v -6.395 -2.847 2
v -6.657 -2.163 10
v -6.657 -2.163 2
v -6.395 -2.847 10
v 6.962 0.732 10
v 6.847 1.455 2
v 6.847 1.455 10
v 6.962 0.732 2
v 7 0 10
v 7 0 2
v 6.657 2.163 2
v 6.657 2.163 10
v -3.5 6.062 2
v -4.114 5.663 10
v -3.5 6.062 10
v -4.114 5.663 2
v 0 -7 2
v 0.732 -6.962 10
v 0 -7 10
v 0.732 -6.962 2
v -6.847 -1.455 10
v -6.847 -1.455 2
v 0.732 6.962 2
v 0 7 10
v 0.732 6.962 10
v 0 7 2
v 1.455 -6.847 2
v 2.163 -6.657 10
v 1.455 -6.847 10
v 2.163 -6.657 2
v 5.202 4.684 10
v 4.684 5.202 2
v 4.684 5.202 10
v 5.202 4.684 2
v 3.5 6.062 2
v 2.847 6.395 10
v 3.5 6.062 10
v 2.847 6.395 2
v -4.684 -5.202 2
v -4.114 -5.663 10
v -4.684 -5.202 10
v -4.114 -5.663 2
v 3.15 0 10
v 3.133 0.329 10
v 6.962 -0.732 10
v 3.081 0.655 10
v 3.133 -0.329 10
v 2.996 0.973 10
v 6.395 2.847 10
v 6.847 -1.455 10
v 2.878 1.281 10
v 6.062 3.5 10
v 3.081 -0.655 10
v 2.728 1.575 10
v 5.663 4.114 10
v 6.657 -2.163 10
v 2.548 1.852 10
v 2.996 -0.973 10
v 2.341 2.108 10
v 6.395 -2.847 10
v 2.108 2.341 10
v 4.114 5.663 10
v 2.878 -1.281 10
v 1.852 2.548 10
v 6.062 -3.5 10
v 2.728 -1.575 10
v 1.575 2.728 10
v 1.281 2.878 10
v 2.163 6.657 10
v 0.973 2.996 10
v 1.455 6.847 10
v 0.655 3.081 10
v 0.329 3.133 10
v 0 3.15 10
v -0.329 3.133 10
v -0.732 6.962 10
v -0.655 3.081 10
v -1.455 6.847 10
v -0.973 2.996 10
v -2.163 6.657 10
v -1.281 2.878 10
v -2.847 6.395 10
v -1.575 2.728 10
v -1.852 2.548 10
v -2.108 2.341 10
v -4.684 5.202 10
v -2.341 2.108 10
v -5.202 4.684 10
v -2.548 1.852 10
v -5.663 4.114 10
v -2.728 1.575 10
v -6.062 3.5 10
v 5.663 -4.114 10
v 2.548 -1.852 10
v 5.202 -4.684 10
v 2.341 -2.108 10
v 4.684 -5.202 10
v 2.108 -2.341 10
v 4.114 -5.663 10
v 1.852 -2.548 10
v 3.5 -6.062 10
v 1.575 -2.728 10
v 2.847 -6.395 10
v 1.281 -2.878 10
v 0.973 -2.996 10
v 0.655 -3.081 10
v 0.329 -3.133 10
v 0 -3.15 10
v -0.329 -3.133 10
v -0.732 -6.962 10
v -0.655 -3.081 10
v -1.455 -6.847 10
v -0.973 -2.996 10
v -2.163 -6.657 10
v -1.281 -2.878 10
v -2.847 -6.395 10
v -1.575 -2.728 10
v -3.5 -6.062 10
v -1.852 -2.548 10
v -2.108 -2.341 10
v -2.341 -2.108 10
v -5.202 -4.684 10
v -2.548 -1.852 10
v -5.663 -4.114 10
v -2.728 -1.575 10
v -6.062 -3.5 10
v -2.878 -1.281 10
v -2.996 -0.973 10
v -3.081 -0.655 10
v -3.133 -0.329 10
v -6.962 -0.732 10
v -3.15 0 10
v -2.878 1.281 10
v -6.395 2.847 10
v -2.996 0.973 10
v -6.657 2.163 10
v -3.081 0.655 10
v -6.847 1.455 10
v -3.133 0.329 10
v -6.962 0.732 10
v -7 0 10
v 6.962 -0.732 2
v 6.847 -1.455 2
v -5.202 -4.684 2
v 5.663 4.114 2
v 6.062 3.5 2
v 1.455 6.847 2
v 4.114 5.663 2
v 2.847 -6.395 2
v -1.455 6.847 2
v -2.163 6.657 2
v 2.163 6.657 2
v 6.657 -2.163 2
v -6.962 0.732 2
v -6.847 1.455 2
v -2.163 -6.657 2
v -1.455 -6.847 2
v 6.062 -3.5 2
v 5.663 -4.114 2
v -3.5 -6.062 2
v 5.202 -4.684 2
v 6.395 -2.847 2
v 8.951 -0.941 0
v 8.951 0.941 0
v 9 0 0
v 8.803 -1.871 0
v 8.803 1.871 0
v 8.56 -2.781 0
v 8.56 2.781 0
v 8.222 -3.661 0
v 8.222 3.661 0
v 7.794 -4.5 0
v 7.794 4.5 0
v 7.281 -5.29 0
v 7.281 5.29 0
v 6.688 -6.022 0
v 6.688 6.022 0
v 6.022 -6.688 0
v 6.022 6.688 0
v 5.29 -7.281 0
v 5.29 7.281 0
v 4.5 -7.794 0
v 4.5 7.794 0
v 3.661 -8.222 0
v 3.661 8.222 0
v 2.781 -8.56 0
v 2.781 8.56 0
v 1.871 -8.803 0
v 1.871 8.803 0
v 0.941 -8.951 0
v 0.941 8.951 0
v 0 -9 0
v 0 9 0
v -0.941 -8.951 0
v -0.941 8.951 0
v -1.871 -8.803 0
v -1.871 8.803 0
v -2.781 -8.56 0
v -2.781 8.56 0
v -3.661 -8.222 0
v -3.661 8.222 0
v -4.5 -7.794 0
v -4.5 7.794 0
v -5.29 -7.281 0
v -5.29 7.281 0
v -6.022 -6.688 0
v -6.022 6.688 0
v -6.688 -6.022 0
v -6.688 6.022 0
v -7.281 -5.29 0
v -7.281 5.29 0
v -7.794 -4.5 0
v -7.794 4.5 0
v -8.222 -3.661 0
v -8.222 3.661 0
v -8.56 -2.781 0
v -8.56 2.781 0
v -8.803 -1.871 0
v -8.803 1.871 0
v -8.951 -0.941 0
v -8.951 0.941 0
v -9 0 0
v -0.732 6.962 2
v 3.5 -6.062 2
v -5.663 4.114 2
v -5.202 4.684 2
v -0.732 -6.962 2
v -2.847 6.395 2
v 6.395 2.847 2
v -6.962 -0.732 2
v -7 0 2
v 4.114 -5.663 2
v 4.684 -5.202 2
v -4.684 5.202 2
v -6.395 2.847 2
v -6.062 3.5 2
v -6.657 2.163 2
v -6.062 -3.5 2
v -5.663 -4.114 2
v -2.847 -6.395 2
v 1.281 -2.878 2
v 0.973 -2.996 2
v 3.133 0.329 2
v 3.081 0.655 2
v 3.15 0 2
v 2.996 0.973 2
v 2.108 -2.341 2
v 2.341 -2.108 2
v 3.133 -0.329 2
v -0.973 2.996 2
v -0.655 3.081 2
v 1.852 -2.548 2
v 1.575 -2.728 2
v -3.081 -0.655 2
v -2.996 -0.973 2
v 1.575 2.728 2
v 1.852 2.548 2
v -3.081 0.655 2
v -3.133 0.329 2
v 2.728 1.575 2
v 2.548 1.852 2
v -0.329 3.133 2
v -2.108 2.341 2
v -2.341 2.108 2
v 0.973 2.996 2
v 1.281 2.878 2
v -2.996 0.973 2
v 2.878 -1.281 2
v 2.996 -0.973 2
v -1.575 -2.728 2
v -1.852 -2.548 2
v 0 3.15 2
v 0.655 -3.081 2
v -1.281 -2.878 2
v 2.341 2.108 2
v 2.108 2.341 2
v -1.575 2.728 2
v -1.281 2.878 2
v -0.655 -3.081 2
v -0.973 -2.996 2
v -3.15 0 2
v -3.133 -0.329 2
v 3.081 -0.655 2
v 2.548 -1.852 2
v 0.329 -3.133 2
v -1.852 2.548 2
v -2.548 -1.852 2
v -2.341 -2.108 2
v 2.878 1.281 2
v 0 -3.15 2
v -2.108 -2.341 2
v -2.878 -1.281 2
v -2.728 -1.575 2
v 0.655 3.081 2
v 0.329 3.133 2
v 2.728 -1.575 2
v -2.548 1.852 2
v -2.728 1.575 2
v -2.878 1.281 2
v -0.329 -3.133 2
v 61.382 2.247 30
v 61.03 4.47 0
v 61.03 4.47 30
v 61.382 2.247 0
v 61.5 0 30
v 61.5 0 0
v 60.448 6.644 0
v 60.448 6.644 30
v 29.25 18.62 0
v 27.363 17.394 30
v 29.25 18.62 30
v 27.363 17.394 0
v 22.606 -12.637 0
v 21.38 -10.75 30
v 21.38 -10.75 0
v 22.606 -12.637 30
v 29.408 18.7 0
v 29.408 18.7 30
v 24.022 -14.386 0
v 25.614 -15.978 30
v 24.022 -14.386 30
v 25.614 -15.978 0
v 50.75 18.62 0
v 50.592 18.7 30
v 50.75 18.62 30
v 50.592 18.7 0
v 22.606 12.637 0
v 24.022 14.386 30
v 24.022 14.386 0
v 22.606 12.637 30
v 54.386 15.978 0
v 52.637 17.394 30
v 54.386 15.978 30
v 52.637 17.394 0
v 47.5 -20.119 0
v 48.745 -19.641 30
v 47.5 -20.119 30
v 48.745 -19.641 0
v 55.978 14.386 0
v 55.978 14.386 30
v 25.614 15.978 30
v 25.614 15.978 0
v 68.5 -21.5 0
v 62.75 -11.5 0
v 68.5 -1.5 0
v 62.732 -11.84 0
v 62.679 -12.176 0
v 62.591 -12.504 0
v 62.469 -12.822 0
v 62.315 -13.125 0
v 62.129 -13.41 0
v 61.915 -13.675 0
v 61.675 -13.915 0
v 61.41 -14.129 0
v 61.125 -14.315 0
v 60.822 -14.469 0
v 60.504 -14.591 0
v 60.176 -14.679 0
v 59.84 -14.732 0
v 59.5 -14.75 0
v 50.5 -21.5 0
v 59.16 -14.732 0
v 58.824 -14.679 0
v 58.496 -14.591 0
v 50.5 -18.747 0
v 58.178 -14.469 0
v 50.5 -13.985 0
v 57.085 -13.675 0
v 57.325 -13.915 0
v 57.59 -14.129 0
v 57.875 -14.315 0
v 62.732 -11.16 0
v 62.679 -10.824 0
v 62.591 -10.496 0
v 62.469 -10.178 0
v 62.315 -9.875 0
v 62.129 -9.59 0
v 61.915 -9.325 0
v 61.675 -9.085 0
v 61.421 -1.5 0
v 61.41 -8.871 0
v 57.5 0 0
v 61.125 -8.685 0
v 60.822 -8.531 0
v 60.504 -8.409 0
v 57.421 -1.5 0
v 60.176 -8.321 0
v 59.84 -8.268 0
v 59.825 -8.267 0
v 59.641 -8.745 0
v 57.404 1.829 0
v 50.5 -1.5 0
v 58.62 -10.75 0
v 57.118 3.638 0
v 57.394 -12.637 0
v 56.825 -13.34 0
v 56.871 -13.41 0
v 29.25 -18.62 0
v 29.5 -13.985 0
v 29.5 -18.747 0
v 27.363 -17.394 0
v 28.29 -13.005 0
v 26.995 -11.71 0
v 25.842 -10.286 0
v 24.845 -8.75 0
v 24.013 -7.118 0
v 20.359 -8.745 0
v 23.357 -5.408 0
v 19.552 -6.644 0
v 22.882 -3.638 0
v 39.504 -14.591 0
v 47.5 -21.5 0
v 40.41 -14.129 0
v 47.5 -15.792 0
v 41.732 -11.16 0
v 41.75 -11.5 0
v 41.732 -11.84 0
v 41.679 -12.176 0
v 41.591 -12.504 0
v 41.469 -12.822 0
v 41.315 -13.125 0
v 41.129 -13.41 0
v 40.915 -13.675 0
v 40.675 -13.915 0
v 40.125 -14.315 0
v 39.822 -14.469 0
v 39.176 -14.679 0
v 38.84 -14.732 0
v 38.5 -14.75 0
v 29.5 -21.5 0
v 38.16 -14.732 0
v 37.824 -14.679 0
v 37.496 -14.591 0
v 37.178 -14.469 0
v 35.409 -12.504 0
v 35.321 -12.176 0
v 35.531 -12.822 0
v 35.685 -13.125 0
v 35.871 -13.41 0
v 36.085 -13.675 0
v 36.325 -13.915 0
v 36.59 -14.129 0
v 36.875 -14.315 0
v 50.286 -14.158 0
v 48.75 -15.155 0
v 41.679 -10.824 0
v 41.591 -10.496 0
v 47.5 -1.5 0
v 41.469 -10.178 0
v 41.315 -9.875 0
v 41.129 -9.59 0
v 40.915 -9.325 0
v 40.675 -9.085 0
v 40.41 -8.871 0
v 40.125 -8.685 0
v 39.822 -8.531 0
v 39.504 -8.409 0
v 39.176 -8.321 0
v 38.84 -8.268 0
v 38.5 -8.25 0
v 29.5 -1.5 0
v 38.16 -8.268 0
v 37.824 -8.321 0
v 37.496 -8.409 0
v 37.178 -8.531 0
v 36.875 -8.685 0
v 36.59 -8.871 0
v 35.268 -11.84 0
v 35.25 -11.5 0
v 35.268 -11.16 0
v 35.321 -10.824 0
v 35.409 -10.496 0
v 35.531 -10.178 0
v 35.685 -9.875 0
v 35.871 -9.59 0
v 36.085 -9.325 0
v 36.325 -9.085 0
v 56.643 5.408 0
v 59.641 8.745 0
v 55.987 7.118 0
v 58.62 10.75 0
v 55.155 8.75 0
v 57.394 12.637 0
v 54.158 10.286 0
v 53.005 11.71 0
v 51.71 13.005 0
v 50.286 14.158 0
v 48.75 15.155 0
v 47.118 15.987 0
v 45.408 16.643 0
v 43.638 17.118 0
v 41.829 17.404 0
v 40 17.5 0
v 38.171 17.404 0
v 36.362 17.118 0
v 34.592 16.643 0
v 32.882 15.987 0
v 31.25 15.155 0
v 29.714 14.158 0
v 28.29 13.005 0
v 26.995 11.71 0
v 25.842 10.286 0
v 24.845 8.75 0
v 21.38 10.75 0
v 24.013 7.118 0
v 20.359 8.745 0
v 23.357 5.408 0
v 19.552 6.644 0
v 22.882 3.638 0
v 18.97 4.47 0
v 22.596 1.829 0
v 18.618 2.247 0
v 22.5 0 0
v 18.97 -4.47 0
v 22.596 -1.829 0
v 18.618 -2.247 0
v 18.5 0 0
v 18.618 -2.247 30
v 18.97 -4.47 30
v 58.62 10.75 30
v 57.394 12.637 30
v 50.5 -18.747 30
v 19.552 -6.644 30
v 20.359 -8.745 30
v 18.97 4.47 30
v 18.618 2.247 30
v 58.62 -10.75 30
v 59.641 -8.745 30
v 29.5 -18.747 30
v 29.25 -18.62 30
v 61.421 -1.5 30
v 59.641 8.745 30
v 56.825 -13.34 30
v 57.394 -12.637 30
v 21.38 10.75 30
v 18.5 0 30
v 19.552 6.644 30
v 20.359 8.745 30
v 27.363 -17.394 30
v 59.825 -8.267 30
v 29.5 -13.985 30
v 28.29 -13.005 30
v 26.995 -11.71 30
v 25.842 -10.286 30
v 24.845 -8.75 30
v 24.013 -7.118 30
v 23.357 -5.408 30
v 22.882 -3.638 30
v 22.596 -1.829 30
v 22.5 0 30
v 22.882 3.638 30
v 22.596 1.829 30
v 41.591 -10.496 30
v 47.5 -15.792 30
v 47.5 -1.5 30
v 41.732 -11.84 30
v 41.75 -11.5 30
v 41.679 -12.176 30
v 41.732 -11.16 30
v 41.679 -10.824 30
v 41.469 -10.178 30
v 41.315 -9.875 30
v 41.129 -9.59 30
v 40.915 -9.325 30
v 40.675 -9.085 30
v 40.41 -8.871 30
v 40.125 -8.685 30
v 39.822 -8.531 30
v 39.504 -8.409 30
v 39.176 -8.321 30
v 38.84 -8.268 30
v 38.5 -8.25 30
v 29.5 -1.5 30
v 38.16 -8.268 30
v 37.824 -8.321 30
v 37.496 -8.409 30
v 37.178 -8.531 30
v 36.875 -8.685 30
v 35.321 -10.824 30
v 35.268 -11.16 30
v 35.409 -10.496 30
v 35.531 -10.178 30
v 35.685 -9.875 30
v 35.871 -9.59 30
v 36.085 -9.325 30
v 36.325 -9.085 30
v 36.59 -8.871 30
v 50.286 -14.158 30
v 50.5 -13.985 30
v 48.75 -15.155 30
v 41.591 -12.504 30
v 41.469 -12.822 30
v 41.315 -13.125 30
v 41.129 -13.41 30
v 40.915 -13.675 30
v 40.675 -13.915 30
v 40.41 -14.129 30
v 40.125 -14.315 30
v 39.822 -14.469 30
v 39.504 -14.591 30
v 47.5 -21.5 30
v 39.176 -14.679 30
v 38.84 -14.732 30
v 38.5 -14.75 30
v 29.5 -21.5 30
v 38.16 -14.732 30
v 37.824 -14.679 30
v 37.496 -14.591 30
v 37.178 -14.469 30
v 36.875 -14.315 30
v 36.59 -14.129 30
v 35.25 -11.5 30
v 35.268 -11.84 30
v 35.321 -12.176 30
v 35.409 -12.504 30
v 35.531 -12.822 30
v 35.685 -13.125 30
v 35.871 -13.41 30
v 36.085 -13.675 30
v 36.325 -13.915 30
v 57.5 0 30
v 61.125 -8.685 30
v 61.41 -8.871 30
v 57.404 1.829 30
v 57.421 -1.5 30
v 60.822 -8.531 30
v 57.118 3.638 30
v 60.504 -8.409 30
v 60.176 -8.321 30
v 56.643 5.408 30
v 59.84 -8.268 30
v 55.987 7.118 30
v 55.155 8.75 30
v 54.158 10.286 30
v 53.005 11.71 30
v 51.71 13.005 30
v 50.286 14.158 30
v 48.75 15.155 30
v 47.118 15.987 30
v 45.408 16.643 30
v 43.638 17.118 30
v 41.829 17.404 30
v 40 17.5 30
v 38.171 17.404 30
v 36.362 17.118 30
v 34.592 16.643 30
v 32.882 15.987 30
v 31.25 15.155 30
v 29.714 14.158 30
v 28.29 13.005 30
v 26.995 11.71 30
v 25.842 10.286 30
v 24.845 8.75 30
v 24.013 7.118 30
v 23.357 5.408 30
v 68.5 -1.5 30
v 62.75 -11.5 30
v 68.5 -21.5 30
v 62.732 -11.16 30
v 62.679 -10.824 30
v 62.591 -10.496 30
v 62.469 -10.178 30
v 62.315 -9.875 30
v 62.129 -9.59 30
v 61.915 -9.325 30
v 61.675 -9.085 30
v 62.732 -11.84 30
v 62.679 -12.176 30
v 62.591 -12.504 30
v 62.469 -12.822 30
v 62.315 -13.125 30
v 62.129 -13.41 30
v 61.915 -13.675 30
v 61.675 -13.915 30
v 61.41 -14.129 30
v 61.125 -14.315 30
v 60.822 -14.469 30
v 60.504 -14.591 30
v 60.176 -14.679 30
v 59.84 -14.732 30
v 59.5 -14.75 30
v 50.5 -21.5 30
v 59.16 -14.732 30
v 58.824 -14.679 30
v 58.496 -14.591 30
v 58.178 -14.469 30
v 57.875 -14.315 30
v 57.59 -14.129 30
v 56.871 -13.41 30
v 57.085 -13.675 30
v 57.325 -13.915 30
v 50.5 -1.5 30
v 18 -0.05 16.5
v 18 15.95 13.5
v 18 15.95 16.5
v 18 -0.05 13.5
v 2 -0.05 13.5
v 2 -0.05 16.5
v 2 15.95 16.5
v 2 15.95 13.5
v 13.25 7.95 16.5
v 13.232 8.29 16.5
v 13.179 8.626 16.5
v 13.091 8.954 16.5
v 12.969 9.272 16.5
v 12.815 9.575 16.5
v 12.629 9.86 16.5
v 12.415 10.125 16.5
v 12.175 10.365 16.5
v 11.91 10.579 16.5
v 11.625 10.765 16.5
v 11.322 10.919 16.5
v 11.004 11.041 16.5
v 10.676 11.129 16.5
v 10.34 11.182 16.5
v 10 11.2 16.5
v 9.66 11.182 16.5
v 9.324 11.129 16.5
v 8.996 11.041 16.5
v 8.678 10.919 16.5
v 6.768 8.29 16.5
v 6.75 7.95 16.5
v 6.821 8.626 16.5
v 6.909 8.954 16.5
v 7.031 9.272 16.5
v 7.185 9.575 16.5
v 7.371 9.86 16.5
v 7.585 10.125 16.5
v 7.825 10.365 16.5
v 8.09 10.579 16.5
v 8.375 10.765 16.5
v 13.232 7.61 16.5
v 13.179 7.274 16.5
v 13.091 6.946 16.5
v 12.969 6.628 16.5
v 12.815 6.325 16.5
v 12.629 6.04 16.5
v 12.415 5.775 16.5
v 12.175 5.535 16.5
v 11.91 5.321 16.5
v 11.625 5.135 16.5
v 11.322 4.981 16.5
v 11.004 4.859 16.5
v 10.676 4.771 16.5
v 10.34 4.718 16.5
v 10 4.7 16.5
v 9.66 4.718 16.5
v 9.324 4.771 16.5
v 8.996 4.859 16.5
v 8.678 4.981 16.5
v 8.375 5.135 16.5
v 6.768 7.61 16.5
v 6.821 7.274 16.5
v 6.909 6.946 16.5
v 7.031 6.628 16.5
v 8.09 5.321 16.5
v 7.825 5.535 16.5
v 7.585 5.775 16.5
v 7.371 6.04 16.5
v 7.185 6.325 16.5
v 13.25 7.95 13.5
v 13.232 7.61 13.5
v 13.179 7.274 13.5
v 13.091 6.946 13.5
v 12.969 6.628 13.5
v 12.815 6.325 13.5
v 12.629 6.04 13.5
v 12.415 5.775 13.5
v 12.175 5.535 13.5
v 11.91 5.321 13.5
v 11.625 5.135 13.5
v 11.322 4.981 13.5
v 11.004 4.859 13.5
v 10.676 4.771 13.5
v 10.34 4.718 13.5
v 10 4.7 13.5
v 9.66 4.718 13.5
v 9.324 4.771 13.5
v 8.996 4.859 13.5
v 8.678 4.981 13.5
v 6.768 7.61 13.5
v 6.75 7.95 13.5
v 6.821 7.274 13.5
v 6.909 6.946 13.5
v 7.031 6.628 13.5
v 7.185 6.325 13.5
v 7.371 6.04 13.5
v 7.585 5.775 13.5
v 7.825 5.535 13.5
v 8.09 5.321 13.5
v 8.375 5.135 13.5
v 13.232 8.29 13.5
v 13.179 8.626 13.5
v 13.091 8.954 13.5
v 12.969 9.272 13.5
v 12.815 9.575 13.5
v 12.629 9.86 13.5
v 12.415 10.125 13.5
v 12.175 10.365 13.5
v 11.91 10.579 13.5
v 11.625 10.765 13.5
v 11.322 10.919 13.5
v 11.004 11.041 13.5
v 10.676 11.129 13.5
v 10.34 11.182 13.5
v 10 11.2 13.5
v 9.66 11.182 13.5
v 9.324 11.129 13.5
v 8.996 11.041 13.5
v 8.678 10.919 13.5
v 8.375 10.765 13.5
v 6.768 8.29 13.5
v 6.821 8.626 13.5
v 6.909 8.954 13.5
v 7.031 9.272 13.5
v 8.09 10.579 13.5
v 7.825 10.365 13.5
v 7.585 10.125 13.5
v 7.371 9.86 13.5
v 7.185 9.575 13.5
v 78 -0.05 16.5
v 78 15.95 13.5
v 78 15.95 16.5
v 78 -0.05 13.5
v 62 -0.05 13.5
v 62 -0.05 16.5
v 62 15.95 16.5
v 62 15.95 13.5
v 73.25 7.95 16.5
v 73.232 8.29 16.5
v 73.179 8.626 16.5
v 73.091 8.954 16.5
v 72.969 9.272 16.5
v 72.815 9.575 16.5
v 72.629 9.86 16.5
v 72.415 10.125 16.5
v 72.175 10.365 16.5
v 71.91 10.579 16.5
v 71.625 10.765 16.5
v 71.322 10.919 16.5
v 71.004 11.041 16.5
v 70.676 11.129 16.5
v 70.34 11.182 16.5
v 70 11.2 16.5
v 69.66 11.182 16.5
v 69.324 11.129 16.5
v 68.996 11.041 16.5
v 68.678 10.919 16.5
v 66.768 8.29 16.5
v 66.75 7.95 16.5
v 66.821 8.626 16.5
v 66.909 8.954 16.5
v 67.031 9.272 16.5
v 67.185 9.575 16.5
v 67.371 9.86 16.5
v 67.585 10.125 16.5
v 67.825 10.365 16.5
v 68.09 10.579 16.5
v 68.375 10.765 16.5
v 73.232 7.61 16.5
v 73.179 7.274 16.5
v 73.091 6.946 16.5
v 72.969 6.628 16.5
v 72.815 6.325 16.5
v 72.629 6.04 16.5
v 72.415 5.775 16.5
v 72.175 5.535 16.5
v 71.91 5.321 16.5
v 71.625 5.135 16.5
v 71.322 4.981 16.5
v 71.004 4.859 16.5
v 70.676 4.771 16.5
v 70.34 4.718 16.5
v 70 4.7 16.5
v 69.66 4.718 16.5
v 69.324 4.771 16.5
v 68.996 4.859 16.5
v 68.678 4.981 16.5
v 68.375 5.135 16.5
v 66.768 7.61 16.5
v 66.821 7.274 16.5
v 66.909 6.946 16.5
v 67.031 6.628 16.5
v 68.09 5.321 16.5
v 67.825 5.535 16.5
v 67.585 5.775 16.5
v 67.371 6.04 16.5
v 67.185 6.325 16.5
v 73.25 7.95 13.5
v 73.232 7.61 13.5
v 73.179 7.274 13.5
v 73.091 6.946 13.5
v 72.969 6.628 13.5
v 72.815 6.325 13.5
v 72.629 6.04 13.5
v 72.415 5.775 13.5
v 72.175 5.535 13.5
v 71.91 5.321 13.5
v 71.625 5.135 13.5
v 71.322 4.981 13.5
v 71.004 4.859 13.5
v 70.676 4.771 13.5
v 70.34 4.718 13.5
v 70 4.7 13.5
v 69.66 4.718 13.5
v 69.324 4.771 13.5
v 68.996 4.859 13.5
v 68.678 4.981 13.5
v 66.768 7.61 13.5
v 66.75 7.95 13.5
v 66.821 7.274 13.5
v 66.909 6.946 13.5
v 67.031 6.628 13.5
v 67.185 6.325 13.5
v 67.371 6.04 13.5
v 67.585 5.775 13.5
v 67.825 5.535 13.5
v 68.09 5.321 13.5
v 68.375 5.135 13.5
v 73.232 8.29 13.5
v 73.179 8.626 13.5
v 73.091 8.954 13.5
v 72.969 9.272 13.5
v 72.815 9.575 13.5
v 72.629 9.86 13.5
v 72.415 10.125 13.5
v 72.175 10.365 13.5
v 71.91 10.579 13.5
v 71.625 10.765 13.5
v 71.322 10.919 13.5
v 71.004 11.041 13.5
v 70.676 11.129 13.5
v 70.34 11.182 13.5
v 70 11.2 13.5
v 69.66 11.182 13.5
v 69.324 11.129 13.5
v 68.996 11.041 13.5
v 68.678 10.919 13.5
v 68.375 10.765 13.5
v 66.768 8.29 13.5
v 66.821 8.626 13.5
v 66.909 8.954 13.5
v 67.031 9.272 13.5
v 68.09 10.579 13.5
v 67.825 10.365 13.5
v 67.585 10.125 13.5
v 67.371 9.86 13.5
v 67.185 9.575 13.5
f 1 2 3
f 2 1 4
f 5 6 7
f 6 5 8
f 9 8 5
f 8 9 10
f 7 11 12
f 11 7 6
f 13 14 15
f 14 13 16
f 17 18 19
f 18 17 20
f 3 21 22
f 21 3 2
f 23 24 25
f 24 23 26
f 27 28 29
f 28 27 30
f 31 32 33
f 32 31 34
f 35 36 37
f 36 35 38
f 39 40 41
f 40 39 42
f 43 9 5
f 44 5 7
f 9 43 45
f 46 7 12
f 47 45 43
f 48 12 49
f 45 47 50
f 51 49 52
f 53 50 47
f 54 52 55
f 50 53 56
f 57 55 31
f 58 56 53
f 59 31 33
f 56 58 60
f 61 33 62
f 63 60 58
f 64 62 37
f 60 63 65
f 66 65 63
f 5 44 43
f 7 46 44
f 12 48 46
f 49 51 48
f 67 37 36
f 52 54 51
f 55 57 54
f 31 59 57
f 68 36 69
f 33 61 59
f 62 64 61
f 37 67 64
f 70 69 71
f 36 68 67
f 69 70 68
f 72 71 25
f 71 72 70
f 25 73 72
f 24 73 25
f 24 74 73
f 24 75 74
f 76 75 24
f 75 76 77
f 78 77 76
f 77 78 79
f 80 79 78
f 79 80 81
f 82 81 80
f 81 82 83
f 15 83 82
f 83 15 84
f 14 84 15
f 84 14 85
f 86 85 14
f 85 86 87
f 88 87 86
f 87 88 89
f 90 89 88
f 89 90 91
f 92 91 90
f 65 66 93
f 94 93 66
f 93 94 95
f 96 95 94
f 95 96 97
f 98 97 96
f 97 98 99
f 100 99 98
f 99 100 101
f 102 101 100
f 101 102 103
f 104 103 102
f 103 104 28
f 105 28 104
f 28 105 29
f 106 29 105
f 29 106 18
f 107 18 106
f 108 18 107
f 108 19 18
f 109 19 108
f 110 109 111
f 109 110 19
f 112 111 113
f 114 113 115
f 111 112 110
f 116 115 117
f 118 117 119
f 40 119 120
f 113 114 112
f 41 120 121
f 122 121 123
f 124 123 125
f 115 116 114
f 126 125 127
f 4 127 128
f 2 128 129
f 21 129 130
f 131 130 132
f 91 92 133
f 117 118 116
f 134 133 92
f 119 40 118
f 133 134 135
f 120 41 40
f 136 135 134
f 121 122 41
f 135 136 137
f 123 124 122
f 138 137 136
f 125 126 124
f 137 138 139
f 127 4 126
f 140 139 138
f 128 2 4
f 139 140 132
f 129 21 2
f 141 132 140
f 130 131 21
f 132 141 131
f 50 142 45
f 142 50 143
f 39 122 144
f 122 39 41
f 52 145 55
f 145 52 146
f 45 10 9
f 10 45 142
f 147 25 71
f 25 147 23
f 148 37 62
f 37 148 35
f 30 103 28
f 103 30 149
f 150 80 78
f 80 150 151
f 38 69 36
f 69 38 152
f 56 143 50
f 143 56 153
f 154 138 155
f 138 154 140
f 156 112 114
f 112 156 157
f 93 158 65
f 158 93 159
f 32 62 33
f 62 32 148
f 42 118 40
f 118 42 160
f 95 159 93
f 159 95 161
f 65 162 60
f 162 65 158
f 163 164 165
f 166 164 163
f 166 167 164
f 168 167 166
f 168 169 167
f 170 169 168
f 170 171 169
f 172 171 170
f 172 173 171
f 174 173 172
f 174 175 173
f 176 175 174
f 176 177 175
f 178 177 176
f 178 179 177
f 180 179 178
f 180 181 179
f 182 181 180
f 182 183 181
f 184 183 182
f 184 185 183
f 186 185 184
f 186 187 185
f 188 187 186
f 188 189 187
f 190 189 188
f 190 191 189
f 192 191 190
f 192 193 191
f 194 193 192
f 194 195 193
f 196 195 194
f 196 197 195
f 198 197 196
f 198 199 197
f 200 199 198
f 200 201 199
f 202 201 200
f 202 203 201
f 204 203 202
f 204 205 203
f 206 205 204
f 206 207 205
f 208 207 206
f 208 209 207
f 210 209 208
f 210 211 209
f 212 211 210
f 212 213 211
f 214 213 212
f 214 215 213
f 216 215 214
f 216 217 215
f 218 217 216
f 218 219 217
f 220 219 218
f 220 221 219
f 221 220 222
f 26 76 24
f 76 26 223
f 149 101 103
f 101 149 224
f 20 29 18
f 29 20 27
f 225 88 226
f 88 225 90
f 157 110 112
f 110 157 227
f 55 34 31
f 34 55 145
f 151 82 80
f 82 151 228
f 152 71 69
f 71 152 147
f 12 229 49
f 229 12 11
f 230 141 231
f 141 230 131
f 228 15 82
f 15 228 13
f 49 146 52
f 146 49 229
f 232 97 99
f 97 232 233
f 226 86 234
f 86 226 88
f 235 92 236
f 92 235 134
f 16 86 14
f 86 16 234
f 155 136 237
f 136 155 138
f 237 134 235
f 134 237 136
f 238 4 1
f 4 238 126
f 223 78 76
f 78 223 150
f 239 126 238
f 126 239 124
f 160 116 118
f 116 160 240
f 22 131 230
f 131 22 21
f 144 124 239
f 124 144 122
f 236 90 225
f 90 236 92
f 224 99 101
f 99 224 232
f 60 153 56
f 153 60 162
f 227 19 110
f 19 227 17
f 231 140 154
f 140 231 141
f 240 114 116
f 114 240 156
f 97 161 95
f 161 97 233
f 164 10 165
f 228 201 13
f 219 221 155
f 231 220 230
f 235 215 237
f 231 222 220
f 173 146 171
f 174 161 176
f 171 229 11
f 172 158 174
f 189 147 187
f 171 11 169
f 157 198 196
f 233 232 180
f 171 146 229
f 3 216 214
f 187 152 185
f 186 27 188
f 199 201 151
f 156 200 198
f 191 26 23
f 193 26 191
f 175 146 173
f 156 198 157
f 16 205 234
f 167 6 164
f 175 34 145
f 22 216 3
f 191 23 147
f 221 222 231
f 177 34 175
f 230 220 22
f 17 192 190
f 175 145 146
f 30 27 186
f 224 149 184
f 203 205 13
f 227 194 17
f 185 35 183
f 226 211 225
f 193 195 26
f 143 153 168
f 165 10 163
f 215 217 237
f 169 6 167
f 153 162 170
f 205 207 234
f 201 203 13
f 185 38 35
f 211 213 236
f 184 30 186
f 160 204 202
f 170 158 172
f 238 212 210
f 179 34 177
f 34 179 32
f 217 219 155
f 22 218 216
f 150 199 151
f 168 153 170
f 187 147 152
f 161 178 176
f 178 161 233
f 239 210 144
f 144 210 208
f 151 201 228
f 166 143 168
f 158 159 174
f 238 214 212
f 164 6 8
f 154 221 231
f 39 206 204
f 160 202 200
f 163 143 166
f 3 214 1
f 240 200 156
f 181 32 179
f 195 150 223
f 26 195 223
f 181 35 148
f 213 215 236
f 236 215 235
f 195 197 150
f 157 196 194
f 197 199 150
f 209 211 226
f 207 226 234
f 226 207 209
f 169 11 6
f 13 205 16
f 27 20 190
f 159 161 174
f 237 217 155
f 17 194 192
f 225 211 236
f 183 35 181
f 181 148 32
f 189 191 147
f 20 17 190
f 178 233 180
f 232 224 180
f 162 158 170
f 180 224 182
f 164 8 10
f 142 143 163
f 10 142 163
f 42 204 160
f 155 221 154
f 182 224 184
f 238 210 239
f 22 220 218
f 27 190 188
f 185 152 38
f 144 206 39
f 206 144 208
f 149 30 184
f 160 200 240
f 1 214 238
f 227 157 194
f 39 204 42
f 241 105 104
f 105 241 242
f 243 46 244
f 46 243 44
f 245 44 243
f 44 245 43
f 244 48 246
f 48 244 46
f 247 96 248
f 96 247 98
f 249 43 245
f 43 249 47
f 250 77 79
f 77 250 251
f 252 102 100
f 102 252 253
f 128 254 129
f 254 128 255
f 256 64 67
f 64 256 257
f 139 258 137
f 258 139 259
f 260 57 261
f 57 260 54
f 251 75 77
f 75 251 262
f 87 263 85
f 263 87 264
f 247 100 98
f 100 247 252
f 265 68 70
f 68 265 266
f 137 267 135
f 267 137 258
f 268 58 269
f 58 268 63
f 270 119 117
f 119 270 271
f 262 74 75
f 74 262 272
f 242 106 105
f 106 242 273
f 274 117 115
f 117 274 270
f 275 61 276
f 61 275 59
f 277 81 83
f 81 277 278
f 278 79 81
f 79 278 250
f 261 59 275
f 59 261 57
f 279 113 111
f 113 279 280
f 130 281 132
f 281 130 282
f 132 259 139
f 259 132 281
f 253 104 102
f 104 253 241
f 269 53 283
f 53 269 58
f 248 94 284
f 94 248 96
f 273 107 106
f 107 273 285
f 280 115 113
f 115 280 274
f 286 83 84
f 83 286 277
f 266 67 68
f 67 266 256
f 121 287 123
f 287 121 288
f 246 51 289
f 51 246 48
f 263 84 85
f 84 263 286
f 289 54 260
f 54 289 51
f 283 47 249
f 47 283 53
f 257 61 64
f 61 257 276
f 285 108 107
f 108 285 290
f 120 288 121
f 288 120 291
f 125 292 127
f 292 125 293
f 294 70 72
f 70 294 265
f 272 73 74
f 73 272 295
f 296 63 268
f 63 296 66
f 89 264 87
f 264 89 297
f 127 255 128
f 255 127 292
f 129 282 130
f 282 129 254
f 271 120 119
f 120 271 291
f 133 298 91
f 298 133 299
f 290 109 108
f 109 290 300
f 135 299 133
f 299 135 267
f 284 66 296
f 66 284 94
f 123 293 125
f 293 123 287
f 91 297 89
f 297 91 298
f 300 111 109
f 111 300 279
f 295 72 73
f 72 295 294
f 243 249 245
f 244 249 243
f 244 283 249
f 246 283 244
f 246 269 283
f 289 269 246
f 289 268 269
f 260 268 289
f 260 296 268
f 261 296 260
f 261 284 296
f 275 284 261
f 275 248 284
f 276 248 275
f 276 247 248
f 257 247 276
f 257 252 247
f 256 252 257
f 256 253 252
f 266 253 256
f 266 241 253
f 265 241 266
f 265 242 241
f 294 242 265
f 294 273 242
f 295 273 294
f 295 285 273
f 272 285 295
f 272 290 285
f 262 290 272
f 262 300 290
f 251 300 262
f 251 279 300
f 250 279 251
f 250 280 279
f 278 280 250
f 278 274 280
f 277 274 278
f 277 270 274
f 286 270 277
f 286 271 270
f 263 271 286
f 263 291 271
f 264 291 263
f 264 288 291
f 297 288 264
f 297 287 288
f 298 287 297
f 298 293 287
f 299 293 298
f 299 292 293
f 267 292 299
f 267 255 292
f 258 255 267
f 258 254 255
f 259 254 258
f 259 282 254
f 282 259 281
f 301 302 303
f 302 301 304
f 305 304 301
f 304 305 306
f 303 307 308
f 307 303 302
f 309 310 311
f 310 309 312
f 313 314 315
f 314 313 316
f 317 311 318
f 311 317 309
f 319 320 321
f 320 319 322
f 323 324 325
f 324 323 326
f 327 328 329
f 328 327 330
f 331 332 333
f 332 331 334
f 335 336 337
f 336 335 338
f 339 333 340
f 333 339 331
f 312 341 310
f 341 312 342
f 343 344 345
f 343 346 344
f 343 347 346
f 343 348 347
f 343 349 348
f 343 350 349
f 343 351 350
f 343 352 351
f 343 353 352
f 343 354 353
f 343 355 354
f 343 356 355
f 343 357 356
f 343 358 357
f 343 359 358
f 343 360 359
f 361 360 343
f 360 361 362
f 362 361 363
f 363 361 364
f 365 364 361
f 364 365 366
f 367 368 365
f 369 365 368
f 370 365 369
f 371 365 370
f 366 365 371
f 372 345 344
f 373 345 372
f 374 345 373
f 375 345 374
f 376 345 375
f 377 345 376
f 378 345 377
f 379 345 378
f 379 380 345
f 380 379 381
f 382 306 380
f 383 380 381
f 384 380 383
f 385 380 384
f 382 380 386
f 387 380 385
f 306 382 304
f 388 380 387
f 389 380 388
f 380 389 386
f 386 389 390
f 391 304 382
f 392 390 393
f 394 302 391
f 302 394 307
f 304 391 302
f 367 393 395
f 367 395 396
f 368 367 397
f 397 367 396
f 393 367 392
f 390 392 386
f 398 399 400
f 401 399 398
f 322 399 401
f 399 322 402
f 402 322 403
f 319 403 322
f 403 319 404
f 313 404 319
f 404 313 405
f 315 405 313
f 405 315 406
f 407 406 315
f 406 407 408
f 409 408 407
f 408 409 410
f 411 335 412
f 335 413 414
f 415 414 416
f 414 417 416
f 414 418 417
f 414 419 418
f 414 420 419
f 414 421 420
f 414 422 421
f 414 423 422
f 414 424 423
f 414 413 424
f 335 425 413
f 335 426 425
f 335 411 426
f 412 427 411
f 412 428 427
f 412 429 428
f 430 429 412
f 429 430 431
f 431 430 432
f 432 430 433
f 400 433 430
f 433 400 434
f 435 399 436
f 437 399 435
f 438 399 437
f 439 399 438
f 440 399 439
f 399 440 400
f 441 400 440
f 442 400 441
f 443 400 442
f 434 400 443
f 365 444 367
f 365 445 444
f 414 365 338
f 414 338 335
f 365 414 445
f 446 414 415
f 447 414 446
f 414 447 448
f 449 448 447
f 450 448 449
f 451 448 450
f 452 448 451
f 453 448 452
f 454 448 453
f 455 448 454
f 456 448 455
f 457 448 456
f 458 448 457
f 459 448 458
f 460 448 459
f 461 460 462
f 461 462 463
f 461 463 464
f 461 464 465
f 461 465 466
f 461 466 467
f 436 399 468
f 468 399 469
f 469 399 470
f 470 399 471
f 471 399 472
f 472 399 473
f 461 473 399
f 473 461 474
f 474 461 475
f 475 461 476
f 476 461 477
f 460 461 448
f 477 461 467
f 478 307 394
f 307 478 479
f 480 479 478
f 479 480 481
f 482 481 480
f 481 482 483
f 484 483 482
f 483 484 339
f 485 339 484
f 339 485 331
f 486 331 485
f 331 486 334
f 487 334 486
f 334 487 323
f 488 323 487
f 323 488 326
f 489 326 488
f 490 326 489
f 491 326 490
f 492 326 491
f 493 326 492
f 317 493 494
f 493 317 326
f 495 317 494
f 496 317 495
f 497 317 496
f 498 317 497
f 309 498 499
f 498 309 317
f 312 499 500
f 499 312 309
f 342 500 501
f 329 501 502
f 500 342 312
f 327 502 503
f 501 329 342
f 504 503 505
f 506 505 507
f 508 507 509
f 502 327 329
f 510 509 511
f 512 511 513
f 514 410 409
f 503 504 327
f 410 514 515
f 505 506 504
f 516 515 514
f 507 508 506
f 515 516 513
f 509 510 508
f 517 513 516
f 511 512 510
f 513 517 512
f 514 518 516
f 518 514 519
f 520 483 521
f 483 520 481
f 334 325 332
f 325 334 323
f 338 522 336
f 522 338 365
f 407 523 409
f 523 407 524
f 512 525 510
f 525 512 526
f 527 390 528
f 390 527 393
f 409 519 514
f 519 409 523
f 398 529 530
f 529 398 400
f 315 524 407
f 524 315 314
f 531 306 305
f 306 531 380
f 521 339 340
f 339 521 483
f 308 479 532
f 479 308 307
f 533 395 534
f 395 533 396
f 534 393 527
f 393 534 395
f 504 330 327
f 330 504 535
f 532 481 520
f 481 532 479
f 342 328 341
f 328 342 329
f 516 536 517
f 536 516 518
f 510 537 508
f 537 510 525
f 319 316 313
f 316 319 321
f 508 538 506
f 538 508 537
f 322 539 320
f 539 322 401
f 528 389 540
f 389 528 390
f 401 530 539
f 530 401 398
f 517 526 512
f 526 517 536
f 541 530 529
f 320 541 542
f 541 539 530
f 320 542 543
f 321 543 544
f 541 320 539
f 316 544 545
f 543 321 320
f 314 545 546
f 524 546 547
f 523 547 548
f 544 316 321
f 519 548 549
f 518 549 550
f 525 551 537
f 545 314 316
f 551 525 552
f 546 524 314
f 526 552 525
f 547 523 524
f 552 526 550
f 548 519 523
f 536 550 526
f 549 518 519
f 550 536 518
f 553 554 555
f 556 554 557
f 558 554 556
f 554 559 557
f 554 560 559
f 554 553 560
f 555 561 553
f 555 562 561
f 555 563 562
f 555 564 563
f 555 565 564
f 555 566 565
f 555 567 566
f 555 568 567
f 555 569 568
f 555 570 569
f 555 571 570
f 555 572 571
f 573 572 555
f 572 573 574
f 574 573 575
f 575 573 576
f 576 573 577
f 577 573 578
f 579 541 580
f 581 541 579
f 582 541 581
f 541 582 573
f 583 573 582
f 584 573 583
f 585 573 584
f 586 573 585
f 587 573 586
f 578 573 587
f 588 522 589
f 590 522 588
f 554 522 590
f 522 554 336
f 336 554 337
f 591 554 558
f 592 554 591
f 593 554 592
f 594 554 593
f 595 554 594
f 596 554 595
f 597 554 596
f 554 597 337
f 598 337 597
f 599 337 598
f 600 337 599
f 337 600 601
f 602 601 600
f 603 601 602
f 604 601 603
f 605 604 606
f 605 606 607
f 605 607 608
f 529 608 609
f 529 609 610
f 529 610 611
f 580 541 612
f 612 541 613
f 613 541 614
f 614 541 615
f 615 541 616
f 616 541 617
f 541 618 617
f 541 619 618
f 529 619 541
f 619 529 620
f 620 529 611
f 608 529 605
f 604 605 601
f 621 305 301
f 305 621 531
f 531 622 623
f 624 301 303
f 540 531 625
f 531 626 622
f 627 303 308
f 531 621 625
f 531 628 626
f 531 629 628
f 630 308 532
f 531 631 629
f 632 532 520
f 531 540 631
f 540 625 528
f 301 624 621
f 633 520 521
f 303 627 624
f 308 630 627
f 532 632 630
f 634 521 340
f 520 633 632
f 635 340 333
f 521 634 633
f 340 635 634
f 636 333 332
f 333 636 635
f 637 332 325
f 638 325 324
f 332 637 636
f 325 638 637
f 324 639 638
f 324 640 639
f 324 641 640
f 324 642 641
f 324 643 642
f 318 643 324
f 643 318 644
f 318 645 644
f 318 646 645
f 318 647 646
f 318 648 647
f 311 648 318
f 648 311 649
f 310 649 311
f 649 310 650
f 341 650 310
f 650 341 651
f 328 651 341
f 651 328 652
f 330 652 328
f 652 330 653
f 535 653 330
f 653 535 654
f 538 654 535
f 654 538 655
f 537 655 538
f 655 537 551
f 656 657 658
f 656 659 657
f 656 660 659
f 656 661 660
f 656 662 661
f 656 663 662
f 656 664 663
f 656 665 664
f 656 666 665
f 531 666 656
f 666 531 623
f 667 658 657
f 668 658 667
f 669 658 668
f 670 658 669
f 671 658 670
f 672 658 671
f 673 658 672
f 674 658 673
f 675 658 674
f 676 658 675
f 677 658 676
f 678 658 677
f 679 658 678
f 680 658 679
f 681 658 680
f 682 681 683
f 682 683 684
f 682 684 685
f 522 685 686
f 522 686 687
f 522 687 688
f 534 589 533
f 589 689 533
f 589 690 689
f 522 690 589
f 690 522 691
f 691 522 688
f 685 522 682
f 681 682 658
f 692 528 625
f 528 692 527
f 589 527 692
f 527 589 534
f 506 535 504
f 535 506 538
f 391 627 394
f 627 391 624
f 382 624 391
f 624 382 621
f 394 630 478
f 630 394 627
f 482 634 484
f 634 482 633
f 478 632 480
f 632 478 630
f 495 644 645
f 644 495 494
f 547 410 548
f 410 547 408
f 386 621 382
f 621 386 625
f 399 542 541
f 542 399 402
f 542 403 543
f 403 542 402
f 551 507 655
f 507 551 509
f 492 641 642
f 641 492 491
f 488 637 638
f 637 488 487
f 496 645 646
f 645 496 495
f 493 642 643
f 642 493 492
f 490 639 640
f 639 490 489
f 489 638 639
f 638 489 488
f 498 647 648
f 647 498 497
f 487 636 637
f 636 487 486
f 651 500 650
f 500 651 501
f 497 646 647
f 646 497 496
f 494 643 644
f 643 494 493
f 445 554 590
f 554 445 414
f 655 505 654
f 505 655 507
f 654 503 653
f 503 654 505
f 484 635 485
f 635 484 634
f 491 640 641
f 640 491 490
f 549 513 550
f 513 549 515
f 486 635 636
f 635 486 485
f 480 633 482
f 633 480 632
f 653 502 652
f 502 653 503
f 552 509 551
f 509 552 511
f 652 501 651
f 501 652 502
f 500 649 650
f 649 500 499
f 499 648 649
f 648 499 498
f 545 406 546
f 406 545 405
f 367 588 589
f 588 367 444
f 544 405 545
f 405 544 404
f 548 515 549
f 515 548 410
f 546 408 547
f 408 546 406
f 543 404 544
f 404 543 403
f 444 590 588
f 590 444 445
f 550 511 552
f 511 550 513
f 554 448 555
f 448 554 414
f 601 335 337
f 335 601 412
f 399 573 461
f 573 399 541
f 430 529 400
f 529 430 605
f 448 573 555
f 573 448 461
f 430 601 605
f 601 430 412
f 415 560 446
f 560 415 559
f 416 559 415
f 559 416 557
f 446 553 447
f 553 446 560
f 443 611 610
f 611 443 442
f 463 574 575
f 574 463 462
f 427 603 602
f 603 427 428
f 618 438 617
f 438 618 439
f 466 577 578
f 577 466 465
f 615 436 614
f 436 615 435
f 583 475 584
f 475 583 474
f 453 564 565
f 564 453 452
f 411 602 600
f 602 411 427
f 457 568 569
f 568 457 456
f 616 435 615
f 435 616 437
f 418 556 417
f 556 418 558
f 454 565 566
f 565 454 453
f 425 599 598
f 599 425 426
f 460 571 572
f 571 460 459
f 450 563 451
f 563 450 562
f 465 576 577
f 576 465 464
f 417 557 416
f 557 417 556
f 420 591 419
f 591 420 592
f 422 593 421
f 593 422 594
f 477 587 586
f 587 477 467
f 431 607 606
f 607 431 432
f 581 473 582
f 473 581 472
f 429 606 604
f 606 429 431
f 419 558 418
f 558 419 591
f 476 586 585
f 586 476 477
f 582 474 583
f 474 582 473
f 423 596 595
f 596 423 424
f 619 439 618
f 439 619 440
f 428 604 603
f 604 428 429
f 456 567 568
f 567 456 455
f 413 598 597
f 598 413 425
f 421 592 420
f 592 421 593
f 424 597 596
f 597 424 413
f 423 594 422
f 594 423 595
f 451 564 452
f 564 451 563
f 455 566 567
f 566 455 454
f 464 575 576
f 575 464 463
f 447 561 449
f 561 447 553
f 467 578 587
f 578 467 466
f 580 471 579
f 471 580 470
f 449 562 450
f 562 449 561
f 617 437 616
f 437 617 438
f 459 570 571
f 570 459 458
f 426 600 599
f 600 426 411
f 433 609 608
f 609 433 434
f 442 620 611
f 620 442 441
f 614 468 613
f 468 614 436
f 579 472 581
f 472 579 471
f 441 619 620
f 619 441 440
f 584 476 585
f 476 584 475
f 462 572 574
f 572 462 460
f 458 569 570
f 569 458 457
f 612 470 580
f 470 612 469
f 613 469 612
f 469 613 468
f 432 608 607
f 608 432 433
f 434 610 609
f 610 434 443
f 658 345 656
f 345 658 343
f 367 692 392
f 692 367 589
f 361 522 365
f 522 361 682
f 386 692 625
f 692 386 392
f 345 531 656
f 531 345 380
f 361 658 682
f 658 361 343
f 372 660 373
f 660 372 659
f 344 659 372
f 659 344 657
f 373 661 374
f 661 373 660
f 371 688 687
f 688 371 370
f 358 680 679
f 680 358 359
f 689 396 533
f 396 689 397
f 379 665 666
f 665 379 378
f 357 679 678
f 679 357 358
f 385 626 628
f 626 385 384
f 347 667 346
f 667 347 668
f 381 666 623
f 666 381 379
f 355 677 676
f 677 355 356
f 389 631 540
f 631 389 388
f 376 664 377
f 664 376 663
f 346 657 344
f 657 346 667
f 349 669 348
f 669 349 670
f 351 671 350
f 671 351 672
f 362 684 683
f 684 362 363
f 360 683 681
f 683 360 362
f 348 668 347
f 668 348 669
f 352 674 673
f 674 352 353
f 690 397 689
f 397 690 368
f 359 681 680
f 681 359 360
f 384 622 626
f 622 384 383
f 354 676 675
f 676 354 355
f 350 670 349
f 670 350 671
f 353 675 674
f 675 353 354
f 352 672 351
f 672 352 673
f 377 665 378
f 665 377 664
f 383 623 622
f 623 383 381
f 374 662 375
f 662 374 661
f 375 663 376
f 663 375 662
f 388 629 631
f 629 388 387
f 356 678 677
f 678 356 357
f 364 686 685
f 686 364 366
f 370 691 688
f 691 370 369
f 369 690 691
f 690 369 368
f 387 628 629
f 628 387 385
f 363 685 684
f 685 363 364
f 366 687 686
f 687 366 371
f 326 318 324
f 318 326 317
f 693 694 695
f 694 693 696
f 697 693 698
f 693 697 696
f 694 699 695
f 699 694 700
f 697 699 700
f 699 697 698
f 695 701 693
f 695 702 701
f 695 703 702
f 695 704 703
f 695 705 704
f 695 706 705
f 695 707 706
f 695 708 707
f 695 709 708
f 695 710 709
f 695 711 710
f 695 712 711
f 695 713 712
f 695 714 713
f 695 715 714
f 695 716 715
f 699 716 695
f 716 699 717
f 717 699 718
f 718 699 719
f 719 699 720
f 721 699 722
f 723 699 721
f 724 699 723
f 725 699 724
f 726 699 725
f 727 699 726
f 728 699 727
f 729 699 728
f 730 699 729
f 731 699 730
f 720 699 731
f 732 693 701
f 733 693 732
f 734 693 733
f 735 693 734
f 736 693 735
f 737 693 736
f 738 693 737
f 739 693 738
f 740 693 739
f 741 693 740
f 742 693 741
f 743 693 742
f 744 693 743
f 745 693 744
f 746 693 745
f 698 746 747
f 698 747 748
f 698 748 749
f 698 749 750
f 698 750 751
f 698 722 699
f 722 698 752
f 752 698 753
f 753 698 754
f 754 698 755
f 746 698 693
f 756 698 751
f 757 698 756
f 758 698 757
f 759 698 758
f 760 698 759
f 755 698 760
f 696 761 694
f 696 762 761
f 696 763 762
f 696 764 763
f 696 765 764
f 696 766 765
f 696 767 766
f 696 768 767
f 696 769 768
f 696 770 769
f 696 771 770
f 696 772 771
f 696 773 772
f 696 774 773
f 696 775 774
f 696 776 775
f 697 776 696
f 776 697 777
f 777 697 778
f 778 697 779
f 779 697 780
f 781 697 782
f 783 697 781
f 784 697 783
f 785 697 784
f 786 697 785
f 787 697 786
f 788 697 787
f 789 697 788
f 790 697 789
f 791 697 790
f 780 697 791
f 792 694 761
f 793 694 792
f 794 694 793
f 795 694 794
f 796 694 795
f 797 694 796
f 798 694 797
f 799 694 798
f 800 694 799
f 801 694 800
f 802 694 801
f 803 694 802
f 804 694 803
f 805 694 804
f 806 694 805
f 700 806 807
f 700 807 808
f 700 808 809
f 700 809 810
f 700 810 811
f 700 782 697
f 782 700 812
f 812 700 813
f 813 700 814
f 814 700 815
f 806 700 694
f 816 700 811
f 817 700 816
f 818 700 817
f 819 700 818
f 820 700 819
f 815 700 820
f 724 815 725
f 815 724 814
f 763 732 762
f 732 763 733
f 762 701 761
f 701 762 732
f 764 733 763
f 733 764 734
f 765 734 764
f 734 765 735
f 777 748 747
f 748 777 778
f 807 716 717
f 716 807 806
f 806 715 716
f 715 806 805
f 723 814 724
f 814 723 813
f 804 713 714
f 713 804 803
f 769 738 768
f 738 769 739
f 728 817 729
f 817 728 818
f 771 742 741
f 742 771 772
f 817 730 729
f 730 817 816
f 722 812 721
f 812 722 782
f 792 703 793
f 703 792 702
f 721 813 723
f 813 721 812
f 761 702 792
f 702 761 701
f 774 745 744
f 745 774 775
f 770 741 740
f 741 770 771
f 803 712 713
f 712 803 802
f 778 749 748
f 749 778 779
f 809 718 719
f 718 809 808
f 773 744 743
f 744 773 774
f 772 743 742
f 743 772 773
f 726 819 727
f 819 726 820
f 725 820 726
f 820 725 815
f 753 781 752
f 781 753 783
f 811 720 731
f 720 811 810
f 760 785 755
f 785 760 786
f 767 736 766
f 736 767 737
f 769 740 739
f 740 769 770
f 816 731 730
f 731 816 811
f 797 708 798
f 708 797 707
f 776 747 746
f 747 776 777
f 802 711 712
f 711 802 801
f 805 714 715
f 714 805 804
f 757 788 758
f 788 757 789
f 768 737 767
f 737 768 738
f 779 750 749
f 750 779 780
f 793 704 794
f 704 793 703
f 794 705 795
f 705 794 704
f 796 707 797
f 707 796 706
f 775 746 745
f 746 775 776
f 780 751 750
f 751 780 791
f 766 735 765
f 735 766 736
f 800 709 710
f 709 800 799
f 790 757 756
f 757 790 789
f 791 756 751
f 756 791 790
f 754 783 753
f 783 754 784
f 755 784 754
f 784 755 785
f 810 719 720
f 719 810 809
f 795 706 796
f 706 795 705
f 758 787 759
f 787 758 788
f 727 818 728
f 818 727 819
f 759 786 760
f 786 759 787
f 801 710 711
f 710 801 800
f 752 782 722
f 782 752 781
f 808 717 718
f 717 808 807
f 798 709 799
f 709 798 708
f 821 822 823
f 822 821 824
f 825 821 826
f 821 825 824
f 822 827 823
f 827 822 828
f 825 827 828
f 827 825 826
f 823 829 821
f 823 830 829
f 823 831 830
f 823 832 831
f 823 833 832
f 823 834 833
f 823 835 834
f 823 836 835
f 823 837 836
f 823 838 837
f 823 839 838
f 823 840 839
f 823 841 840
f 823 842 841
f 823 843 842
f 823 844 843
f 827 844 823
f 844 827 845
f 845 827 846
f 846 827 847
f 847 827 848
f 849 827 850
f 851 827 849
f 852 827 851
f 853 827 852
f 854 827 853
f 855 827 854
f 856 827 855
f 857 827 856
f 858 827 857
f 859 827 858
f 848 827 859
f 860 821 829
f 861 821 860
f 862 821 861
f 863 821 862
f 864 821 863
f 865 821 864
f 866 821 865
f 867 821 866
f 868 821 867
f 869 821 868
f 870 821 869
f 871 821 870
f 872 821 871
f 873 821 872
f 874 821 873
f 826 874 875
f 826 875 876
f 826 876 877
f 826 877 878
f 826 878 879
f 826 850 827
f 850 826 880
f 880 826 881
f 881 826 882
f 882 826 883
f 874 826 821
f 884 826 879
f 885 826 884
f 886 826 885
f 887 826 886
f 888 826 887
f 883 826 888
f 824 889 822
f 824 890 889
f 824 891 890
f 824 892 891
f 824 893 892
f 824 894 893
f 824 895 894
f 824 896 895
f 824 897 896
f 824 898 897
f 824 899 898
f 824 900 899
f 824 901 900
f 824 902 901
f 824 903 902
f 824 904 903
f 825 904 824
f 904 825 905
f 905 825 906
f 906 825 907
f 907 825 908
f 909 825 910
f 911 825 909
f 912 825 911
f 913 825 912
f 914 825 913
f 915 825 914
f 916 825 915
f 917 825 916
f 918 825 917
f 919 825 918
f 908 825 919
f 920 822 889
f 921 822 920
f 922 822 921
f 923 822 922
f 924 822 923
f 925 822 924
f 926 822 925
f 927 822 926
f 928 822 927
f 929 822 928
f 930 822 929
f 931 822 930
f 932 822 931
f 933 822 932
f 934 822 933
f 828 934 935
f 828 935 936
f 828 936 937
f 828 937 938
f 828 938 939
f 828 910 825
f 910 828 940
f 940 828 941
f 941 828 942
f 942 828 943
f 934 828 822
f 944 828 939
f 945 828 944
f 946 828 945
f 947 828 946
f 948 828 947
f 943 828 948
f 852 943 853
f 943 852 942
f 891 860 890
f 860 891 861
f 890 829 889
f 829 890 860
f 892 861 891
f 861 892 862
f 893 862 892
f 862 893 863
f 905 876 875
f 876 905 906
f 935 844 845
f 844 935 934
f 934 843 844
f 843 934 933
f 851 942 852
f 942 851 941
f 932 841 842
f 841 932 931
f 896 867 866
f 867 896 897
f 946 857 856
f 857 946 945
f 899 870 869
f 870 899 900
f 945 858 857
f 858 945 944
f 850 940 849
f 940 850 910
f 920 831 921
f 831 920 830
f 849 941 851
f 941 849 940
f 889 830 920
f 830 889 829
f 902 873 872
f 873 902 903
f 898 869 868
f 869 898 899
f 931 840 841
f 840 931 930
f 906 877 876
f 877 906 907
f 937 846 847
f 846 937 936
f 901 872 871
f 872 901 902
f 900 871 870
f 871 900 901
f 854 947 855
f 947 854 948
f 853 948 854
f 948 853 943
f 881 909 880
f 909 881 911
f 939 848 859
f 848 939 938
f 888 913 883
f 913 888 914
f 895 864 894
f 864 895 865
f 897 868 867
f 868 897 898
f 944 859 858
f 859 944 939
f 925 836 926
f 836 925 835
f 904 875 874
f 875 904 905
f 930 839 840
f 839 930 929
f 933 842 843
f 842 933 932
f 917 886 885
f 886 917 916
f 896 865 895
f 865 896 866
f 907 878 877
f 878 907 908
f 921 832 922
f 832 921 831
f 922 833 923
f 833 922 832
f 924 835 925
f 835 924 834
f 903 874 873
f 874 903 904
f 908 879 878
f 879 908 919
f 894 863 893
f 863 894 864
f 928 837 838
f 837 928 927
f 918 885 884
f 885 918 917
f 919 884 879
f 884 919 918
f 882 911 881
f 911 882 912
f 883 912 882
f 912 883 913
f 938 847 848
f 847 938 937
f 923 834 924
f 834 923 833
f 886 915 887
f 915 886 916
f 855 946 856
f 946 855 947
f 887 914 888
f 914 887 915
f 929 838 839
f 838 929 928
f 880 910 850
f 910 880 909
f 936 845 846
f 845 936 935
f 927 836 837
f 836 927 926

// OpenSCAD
// =============================================================================
// FestivAir Haven Node — Tripod Mount & Pole Clamp Adapter
// =============================================================================
// 1/4"-20 UNC heat-set insert boss for standard tripod / camera mounts
// 35mm pole clamp adapter with M6 bolt holes for festival pole deployment
// =============================================================================

// --- 1/4"-20 Heat-Set Insert Parameters ---
// Standard brass heat-set insert for 1/4"-20: OD ~6.3mm, length ~6.35mm
insert_od       = 6.3;      // Heat-set insert outer diameter
insert_depth    = 8;         // Hole depth (slightly deeper than insert)
boss_od         = 14;        // Boss outer diameter (structural)
boss_h          = 10;        // Boss total height
boss_fillet     = 2;         // Base fillet radius

// --- 35mm Pole Clamp Parameters ---
pole_dia        = 35;        // Target pole diameter
clamp_thickness = 4;         // Clamp wall thickness
clamp_width     = 30;        // Clamp width (along pole axis)
clamp_gap       = 3;         // Gap for bolt clamping
tab_w           = 18;        // Bolt tab width
tab_h           = 20;        // Bolt tab height from clamp OD
m6_hole         = 6.5;       // M6 bolt clearance hole

// --------------------------------------------------------------------------
// 1/4"-20 heat-set insert boss
// Sits on the bottom face of the enclosure; printed boss-up so the
// cylinder is on the build plate (no supports needed).
// --------------------------------------------------------------------------
module tripod_boss() {
    difference() {
        union() {
            // Main boss cylinder
            cylinder(d = boss_od, h = boss_h, $fn = 60);
            // Base reinforcement fillet (45-degree cone = printable)
            cylinder(d1 = boss_od + boss_fillet * 2,
                     d2 = boss_od,
                     h  = boss_fillet, $fn = 60);
        }
        // Heat-set insert hole (from top, blind hole)
        translate([0, 0, boss_h - insert_depth])
            cylinder(d = insert_od, h = insert_depth + 0.1, $fn = 60);
    }
}

// --------------------------------------------------------------------------
// 35mm pole clamp — C-clamp with bolt tabs
// Mounts to the back face of the enclosure via integrated attachment tabs.
// Clamp opens at the bottom; two M6 bolts squeeze it shut.
// --------------------------------------------------------------------------
module pole_clamp() {
    clamp_or = pole_dia / 2 + clamp_thickness;
    clamp_ir = pole_dia / 2;

    difference() {
        union() {
            // --- C-clamp body ---
            difference() {
                // Outer cylinder
                cylinder(r = clamp_or, h = clamp_width, $fn = 60);
                // Inner bore
                translate([0, 0, -0.1])
                    cylinder(r = clamp_ir, h = clamp_width + 0.2, $fn = 60);
                // Opening gap at bottom (-Y)
                translate([-clamp_gap/2, -(clamp_or + 1), -0.1])
                    cube([clamp_gap, clamp_or + 1, clamp_width + 0.2]);
            }

            // --- Bolt tabs (two flanges at the gap) ---
            for (sx = [-1, 1]) {
                translate([sx * (clamp_gap/2 + tab_w/2), -(clamp_or), 0])
                    difference() {
                        // Tab body
                        cube([tab_w, tab_h, clamp_width], center = false);
                        // Bolt hole
                        translate([tab_w/2, tab_h/2, -0.1])
                            cylinder(d = m6_hole, h = clamp_width + 0.2, $fn = 60);
                    }
            }
        }

        // Flatten the back face (+Y) for mounting flush against enclosure
        translate([-(clamp_or + 1), clamp_ir + clamp_thickness * 0.3, -0.1])
            cube([clamp_or * 2 + 2, clamp_or, clamp_width + 0.2]);
    }
}

// --------------------------------------------------------------------------
// Enclosure mounting tabs — attach pole clamp to enclosure back wall
// Two tabs with M6 bolt holes, spaced to match enclosure screw bosses
// --------------------------------------------------------------------------
module clamp_mount_tabs(spacing = 60, wall_t = 3) {
    tab_thickness = wall_t;
    tab_size      = 16;

    for (sx = [-1, 1]) {
        translate([sx * spacing/2, 0, 0])
            difference() {
                // Tab body
                cube([tab_size, tab_thickness, tab_size], center = true);
                // M6 bolt hole through tab
                rotate([90, 0, 0])
                    cylinder(d = m6_hole, h = tab_thickness + 1, center = true, $fn = 60);
            }
    }
}

// --------------------------------------------------------------------------
// Complete pole mount assembly (clamp + attachment interface)
// --------------------------------------------------------------------------
module pole_mount_assembly() {
    // Clamp, oriented so the flat back faces +Y
    pole_clamp();

    // Attachment tabs at the flat back
    clamp_or = pole_dia / 2 + clamp_thickness;
    translate([0, clamp_or * 0.3 + 1.5, clamp_width / 2])
        rotate([90, 0, 0])
            clamp_mount_tabs();
}

// Preview when opened directly
translate([0, 0, 0])   tripod_boss();
translate([40, 0, 0])  pole_mount_assembly();
